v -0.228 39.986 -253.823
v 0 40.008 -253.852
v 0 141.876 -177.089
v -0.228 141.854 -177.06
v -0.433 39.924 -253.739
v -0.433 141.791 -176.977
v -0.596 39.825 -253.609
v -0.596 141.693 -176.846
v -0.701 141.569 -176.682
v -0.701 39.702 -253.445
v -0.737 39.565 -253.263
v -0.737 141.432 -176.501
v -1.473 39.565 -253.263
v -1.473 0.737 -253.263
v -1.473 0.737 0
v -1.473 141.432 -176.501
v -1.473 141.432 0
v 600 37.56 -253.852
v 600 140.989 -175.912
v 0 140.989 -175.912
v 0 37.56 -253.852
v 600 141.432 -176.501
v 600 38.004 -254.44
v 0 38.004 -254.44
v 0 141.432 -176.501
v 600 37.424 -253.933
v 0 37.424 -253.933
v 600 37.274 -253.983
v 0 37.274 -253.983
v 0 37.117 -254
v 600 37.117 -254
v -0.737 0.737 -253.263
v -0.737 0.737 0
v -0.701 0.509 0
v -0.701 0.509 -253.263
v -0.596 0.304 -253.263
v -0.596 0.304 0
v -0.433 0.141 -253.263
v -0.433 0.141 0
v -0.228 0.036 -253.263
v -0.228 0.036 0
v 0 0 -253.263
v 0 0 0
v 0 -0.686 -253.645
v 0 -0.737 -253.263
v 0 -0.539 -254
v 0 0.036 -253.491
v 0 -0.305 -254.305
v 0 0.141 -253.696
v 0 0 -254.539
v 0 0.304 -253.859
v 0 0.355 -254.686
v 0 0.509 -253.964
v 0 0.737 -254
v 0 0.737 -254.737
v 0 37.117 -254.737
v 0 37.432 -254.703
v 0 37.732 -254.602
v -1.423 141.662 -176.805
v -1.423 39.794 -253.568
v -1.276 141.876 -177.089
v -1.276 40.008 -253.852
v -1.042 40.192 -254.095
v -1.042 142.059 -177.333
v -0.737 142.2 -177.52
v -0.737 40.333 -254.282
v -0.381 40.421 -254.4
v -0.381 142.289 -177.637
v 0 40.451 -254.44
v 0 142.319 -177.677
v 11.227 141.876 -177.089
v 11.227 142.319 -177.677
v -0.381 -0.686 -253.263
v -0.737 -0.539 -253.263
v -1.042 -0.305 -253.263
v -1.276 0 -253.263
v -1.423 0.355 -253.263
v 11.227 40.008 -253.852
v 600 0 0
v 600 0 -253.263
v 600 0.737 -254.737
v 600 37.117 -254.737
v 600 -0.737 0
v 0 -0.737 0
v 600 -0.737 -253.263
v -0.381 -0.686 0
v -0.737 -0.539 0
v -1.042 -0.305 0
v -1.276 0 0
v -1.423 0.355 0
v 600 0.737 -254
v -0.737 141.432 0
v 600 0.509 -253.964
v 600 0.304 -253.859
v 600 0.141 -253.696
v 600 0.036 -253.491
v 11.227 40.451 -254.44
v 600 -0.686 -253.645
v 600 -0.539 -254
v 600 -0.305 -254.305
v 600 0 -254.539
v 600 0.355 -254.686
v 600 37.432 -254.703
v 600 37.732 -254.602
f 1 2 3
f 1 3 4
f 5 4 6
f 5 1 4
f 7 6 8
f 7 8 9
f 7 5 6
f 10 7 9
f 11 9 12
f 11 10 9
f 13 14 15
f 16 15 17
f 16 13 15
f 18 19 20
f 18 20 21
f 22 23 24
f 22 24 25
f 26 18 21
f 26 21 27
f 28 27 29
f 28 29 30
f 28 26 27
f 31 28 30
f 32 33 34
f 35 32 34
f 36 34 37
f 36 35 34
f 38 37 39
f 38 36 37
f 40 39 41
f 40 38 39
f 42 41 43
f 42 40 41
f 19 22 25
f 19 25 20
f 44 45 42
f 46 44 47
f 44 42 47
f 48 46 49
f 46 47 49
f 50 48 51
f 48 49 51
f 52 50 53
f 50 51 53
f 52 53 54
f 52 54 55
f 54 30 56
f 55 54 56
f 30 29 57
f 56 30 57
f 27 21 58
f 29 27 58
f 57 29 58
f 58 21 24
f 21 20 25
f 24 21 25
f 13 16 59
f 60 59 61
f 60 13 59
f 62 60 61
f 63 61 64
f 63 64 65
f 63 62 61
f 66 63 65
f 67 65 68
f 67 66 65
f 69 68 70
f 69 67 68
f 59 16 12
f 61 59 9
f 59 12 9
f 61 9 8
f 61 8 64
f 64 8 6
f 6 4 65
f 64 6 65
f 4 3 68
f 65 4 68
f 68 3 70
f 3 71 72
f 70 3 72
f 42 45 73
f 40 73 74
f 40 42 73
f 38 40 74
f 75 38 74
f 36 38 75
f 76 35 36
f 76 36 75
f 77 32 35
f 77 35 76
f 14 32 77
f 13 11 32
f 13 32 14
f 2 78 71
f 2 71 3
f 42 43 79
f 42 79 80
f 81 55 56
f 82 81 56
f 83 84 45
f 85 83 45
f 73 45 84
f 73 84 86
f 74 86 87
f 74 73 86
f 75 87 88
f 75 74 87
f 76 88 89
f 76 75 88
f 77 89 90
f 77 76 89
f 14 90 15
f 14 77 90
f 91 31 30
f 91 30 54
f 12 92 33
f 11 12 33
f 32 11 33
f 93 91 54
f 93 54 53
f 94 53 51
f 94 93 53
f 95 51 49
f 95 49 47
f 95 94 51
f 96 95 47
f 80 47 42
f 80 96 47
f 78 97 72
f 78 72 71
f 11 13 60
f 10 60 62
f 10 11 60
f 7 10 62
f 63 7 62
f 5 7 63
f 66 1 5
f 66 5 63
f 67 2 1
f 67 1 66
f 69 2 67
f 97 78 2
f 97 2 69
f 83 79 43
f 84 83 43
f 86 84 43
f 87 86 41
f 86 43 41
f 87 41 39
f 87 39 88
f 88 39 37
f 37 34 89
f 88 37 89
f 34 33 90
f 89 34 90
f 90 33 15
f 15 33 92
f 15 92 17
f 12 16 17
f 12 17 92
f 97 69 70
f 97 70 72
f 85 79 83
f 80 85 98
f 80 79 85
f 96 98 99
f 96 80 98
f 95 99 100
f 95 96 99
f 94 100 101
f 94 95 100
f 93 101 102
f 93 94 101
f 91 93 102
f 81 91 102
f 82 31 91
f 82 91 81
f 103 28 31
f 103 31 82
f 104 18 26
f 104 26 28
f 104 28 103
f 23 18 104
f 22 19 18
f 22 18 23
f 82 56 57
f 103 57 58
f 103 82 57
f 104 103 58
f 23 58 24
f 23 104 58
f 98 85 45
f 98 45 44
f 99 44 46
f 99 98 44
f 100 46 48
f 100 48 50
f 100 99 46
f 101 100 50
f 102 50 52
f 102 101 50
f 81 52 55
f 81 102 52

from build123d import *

# Parameters (mm, degrees)
SKETCH2_W                    = 254
SKETCH2_H                    = 0.7366
BASE_FLANGE1_DEPTH           = 600
EDGE_FLANGE1_STRIP_W         = 4.4196
EDGE_FLANGE1_STRIP_H         = 0.7366
EDGE_FLANGE1_STRIP_CUT_DEPTH = 600
EDGE_FLANGE1_DEPTH           = 600
EDGE_FLANGE2_STRIP_CUT_DEPTH = 600
EDGE_FLANGE2_DEPTH           = 600
EDGE_FLANGE3_DEPTH           = 253.2634
CUT_EXTRUDE1_DEPTH           = 669.329179279
EDGE_FLANGE4_DEPTH           = 127.552071744


# Sheet-metal steps are written as plain solids
with BuildPart() as part:
    # Sketch2 → Base-Flange1 (new body)
    with BuildSketch(Plane(origin=(0, 0, 0), x_dir=(0, 0, -1), z_dir=(1, 0, 0))):
        with Locations((127, -0.3683)):
            Rectangle(SKETCH2_W, SKETCH2_H)
    extrude(amount=BASE_FLANGE1_DEPTH)

    # Edge-Flange1 strip (across the edge) → Edge-Flange1 strip cut (cut)
    with BuildSketch(Plane(origin=(600, 0, -254), x_dir=(0, 0, 1), z_dir=(-1, 0, 0))):
        with Locations((-1.4732, -0.3683)):
            Rectangle(EDGE_FLANGE1_STRIP_W, EDGE_FLANGE1_STRIP_H)
    extrude(amount=EDGE_FLANGE1_STRIP_CUT_DEPTH, mode=Mode.SUBTRACT)

    # Edge-Flange1 section (across the edge) → Edge-Flange1 (add)
    with BuildSketch(Plane(origin=(600, 0, -254), x_dir=(0, 0, 1), z_dir=(-1, 0, 0))):
        with BuildLine():
            Line((-0.7366, 0.7366), (-0.7366, 37.3634))
            Line((-0.7366, 37.3634), (0, 37.3634))
            Line((0, 37.3634), (0, 0.7366))
            ThreePointArc((0, 0.7366), (0.215745145, 0.215745145), (0.7366, 0))
            Line((0.7366, 0), (0.7366, -0.7366))
            ThreePointArc((0.7366, -0.7366), (-0.30510971, -0.30510971), (-0.7366, 0.7366))
        make_face()
    extrude(amount=EDGE_FLANGE1_DEPTH)

    # Edge-Flange2 strip (across the edge) → Edge-Flange2 strip cut (cut)
    with BuildSketch(Plane(origin=(600, 37.3634, -254), x_dir=(0, -0.6018150231520416, 0.7986355100472979), z_dir=(-1, 0, 0))):
        Polygon((-3.09973151, 2.88951852), (-0.439949833, -0.64013098), (0.148325083, -0.196834034), (-2.511456593, 3.332815466), align=None)
    extrude(amount=EDGE_FLANGE2_STRIP_CUT_DEPTH, mode=Mode.SUBTRACT)

    # Edge-Flange2 section (across the edge) → Edge-Flange2 (add)
    with BuildSketch(Plane(origin=(600, 37.3634, -254), x_dir=(0, -0.6018150231520416, 0.7986355100472979), z_dir=(-1, 0, 0))):
        with BuildLine():
            Line((-0.7366, 0.246462912), (-0.7366, 129.753537088))
            Line((-0.7366, 129.753537088), (0, 129.753537088))
            Line((0, 129.753537088), (0, 0.246462912))
            ThreePointArc((0, 0.246462912), (0.038064796, 0.012736302), (0.148325083, -0.196834034))
            Line((0.148325083, -0.196834034), (-0.439949833, -0.64013098))
            ThreePointArc((-0.439949833, -0.64013098), (-0.660470409, -0.220990307), (-0.7366, 0.246462912))
        make_face()
    extrude(amount=EDGE_FLANGE2_DEPTH)

    # Edge-Flange3 section (across the edge) → Edge-Flange3 (add)
    with BuildSketch(Plane(origin=(-0.7366, 0, -253.2634), x_dir=(1, 0, 0), z_dir=(0, 0, 1))):
        with BuildLine():
            Line((-0.7366, 0.7366), (-0.7366, 141.432479218))
            Line((-0.7366, 141.432479218), (0, 141.432479218))
            Line((0, 141.432479218), (0, 0.7366))
            ThreePointArc((0, 0.7366), (0.215745145, 0.215745145), (0.7366, 0))
            Line((0.7366, 0), (0.7366, -0.7366))
            ThreePointArc((0.7366, -0.7366), (-0.30510971, -0.30510971), (-0.7366, 0.7366))
        make_face()
    extrude(amount=EDGE_FLANGE3_DEPTH)

    # Sketch16 → Cut-Extrude1 (cut, through all)
    with BuildSketch(Plane.ZY.offset(1.4732)):
        Polygon((-254.439949833, 38.00353098), (-176.50064699, 141.432479218), (-254.439949833, 141.432479218), align=None)
    extrude(amount=-CUT_EXTRUDE1_DEPTH, mode=Mode.SUBTRACT)

    # Edge-Flange4 section (across the edge) → Edge-Flange4 (add)
    with BuildSketch(Plane(origin=(-0.7366, 40.00816229, -253.851674917), x_dir=(5.5927072616139335e-15, -0.6018150231520416, 0.7986355100472979), z_dir=(-2.7888745978675463e-15, 0.7986355100472979, 0.6018150231520416))):
        with BuildLine():
            Line((-0.7366, 0.7366), (-0.7366, 11.9634))
            Line((-0.7366, 11.9634), (0, 11.9634))
            Line((0, 11.9634), (0, 0.7366))
            ThreePointArc((0, 0.7366), (0.215745145, 0.215745145), (0.7366, 0))
            Line((0.7366, 0), (0.7366, -0.7366))
            ThreePointArc((0.7366, -0.7366), (-0.30510971, -0.30510971), (-0.7366, 0.7366))
        make_face()
    extrude(amount=EDGE_FLANGE4_DEPTH)


solid = part.part
